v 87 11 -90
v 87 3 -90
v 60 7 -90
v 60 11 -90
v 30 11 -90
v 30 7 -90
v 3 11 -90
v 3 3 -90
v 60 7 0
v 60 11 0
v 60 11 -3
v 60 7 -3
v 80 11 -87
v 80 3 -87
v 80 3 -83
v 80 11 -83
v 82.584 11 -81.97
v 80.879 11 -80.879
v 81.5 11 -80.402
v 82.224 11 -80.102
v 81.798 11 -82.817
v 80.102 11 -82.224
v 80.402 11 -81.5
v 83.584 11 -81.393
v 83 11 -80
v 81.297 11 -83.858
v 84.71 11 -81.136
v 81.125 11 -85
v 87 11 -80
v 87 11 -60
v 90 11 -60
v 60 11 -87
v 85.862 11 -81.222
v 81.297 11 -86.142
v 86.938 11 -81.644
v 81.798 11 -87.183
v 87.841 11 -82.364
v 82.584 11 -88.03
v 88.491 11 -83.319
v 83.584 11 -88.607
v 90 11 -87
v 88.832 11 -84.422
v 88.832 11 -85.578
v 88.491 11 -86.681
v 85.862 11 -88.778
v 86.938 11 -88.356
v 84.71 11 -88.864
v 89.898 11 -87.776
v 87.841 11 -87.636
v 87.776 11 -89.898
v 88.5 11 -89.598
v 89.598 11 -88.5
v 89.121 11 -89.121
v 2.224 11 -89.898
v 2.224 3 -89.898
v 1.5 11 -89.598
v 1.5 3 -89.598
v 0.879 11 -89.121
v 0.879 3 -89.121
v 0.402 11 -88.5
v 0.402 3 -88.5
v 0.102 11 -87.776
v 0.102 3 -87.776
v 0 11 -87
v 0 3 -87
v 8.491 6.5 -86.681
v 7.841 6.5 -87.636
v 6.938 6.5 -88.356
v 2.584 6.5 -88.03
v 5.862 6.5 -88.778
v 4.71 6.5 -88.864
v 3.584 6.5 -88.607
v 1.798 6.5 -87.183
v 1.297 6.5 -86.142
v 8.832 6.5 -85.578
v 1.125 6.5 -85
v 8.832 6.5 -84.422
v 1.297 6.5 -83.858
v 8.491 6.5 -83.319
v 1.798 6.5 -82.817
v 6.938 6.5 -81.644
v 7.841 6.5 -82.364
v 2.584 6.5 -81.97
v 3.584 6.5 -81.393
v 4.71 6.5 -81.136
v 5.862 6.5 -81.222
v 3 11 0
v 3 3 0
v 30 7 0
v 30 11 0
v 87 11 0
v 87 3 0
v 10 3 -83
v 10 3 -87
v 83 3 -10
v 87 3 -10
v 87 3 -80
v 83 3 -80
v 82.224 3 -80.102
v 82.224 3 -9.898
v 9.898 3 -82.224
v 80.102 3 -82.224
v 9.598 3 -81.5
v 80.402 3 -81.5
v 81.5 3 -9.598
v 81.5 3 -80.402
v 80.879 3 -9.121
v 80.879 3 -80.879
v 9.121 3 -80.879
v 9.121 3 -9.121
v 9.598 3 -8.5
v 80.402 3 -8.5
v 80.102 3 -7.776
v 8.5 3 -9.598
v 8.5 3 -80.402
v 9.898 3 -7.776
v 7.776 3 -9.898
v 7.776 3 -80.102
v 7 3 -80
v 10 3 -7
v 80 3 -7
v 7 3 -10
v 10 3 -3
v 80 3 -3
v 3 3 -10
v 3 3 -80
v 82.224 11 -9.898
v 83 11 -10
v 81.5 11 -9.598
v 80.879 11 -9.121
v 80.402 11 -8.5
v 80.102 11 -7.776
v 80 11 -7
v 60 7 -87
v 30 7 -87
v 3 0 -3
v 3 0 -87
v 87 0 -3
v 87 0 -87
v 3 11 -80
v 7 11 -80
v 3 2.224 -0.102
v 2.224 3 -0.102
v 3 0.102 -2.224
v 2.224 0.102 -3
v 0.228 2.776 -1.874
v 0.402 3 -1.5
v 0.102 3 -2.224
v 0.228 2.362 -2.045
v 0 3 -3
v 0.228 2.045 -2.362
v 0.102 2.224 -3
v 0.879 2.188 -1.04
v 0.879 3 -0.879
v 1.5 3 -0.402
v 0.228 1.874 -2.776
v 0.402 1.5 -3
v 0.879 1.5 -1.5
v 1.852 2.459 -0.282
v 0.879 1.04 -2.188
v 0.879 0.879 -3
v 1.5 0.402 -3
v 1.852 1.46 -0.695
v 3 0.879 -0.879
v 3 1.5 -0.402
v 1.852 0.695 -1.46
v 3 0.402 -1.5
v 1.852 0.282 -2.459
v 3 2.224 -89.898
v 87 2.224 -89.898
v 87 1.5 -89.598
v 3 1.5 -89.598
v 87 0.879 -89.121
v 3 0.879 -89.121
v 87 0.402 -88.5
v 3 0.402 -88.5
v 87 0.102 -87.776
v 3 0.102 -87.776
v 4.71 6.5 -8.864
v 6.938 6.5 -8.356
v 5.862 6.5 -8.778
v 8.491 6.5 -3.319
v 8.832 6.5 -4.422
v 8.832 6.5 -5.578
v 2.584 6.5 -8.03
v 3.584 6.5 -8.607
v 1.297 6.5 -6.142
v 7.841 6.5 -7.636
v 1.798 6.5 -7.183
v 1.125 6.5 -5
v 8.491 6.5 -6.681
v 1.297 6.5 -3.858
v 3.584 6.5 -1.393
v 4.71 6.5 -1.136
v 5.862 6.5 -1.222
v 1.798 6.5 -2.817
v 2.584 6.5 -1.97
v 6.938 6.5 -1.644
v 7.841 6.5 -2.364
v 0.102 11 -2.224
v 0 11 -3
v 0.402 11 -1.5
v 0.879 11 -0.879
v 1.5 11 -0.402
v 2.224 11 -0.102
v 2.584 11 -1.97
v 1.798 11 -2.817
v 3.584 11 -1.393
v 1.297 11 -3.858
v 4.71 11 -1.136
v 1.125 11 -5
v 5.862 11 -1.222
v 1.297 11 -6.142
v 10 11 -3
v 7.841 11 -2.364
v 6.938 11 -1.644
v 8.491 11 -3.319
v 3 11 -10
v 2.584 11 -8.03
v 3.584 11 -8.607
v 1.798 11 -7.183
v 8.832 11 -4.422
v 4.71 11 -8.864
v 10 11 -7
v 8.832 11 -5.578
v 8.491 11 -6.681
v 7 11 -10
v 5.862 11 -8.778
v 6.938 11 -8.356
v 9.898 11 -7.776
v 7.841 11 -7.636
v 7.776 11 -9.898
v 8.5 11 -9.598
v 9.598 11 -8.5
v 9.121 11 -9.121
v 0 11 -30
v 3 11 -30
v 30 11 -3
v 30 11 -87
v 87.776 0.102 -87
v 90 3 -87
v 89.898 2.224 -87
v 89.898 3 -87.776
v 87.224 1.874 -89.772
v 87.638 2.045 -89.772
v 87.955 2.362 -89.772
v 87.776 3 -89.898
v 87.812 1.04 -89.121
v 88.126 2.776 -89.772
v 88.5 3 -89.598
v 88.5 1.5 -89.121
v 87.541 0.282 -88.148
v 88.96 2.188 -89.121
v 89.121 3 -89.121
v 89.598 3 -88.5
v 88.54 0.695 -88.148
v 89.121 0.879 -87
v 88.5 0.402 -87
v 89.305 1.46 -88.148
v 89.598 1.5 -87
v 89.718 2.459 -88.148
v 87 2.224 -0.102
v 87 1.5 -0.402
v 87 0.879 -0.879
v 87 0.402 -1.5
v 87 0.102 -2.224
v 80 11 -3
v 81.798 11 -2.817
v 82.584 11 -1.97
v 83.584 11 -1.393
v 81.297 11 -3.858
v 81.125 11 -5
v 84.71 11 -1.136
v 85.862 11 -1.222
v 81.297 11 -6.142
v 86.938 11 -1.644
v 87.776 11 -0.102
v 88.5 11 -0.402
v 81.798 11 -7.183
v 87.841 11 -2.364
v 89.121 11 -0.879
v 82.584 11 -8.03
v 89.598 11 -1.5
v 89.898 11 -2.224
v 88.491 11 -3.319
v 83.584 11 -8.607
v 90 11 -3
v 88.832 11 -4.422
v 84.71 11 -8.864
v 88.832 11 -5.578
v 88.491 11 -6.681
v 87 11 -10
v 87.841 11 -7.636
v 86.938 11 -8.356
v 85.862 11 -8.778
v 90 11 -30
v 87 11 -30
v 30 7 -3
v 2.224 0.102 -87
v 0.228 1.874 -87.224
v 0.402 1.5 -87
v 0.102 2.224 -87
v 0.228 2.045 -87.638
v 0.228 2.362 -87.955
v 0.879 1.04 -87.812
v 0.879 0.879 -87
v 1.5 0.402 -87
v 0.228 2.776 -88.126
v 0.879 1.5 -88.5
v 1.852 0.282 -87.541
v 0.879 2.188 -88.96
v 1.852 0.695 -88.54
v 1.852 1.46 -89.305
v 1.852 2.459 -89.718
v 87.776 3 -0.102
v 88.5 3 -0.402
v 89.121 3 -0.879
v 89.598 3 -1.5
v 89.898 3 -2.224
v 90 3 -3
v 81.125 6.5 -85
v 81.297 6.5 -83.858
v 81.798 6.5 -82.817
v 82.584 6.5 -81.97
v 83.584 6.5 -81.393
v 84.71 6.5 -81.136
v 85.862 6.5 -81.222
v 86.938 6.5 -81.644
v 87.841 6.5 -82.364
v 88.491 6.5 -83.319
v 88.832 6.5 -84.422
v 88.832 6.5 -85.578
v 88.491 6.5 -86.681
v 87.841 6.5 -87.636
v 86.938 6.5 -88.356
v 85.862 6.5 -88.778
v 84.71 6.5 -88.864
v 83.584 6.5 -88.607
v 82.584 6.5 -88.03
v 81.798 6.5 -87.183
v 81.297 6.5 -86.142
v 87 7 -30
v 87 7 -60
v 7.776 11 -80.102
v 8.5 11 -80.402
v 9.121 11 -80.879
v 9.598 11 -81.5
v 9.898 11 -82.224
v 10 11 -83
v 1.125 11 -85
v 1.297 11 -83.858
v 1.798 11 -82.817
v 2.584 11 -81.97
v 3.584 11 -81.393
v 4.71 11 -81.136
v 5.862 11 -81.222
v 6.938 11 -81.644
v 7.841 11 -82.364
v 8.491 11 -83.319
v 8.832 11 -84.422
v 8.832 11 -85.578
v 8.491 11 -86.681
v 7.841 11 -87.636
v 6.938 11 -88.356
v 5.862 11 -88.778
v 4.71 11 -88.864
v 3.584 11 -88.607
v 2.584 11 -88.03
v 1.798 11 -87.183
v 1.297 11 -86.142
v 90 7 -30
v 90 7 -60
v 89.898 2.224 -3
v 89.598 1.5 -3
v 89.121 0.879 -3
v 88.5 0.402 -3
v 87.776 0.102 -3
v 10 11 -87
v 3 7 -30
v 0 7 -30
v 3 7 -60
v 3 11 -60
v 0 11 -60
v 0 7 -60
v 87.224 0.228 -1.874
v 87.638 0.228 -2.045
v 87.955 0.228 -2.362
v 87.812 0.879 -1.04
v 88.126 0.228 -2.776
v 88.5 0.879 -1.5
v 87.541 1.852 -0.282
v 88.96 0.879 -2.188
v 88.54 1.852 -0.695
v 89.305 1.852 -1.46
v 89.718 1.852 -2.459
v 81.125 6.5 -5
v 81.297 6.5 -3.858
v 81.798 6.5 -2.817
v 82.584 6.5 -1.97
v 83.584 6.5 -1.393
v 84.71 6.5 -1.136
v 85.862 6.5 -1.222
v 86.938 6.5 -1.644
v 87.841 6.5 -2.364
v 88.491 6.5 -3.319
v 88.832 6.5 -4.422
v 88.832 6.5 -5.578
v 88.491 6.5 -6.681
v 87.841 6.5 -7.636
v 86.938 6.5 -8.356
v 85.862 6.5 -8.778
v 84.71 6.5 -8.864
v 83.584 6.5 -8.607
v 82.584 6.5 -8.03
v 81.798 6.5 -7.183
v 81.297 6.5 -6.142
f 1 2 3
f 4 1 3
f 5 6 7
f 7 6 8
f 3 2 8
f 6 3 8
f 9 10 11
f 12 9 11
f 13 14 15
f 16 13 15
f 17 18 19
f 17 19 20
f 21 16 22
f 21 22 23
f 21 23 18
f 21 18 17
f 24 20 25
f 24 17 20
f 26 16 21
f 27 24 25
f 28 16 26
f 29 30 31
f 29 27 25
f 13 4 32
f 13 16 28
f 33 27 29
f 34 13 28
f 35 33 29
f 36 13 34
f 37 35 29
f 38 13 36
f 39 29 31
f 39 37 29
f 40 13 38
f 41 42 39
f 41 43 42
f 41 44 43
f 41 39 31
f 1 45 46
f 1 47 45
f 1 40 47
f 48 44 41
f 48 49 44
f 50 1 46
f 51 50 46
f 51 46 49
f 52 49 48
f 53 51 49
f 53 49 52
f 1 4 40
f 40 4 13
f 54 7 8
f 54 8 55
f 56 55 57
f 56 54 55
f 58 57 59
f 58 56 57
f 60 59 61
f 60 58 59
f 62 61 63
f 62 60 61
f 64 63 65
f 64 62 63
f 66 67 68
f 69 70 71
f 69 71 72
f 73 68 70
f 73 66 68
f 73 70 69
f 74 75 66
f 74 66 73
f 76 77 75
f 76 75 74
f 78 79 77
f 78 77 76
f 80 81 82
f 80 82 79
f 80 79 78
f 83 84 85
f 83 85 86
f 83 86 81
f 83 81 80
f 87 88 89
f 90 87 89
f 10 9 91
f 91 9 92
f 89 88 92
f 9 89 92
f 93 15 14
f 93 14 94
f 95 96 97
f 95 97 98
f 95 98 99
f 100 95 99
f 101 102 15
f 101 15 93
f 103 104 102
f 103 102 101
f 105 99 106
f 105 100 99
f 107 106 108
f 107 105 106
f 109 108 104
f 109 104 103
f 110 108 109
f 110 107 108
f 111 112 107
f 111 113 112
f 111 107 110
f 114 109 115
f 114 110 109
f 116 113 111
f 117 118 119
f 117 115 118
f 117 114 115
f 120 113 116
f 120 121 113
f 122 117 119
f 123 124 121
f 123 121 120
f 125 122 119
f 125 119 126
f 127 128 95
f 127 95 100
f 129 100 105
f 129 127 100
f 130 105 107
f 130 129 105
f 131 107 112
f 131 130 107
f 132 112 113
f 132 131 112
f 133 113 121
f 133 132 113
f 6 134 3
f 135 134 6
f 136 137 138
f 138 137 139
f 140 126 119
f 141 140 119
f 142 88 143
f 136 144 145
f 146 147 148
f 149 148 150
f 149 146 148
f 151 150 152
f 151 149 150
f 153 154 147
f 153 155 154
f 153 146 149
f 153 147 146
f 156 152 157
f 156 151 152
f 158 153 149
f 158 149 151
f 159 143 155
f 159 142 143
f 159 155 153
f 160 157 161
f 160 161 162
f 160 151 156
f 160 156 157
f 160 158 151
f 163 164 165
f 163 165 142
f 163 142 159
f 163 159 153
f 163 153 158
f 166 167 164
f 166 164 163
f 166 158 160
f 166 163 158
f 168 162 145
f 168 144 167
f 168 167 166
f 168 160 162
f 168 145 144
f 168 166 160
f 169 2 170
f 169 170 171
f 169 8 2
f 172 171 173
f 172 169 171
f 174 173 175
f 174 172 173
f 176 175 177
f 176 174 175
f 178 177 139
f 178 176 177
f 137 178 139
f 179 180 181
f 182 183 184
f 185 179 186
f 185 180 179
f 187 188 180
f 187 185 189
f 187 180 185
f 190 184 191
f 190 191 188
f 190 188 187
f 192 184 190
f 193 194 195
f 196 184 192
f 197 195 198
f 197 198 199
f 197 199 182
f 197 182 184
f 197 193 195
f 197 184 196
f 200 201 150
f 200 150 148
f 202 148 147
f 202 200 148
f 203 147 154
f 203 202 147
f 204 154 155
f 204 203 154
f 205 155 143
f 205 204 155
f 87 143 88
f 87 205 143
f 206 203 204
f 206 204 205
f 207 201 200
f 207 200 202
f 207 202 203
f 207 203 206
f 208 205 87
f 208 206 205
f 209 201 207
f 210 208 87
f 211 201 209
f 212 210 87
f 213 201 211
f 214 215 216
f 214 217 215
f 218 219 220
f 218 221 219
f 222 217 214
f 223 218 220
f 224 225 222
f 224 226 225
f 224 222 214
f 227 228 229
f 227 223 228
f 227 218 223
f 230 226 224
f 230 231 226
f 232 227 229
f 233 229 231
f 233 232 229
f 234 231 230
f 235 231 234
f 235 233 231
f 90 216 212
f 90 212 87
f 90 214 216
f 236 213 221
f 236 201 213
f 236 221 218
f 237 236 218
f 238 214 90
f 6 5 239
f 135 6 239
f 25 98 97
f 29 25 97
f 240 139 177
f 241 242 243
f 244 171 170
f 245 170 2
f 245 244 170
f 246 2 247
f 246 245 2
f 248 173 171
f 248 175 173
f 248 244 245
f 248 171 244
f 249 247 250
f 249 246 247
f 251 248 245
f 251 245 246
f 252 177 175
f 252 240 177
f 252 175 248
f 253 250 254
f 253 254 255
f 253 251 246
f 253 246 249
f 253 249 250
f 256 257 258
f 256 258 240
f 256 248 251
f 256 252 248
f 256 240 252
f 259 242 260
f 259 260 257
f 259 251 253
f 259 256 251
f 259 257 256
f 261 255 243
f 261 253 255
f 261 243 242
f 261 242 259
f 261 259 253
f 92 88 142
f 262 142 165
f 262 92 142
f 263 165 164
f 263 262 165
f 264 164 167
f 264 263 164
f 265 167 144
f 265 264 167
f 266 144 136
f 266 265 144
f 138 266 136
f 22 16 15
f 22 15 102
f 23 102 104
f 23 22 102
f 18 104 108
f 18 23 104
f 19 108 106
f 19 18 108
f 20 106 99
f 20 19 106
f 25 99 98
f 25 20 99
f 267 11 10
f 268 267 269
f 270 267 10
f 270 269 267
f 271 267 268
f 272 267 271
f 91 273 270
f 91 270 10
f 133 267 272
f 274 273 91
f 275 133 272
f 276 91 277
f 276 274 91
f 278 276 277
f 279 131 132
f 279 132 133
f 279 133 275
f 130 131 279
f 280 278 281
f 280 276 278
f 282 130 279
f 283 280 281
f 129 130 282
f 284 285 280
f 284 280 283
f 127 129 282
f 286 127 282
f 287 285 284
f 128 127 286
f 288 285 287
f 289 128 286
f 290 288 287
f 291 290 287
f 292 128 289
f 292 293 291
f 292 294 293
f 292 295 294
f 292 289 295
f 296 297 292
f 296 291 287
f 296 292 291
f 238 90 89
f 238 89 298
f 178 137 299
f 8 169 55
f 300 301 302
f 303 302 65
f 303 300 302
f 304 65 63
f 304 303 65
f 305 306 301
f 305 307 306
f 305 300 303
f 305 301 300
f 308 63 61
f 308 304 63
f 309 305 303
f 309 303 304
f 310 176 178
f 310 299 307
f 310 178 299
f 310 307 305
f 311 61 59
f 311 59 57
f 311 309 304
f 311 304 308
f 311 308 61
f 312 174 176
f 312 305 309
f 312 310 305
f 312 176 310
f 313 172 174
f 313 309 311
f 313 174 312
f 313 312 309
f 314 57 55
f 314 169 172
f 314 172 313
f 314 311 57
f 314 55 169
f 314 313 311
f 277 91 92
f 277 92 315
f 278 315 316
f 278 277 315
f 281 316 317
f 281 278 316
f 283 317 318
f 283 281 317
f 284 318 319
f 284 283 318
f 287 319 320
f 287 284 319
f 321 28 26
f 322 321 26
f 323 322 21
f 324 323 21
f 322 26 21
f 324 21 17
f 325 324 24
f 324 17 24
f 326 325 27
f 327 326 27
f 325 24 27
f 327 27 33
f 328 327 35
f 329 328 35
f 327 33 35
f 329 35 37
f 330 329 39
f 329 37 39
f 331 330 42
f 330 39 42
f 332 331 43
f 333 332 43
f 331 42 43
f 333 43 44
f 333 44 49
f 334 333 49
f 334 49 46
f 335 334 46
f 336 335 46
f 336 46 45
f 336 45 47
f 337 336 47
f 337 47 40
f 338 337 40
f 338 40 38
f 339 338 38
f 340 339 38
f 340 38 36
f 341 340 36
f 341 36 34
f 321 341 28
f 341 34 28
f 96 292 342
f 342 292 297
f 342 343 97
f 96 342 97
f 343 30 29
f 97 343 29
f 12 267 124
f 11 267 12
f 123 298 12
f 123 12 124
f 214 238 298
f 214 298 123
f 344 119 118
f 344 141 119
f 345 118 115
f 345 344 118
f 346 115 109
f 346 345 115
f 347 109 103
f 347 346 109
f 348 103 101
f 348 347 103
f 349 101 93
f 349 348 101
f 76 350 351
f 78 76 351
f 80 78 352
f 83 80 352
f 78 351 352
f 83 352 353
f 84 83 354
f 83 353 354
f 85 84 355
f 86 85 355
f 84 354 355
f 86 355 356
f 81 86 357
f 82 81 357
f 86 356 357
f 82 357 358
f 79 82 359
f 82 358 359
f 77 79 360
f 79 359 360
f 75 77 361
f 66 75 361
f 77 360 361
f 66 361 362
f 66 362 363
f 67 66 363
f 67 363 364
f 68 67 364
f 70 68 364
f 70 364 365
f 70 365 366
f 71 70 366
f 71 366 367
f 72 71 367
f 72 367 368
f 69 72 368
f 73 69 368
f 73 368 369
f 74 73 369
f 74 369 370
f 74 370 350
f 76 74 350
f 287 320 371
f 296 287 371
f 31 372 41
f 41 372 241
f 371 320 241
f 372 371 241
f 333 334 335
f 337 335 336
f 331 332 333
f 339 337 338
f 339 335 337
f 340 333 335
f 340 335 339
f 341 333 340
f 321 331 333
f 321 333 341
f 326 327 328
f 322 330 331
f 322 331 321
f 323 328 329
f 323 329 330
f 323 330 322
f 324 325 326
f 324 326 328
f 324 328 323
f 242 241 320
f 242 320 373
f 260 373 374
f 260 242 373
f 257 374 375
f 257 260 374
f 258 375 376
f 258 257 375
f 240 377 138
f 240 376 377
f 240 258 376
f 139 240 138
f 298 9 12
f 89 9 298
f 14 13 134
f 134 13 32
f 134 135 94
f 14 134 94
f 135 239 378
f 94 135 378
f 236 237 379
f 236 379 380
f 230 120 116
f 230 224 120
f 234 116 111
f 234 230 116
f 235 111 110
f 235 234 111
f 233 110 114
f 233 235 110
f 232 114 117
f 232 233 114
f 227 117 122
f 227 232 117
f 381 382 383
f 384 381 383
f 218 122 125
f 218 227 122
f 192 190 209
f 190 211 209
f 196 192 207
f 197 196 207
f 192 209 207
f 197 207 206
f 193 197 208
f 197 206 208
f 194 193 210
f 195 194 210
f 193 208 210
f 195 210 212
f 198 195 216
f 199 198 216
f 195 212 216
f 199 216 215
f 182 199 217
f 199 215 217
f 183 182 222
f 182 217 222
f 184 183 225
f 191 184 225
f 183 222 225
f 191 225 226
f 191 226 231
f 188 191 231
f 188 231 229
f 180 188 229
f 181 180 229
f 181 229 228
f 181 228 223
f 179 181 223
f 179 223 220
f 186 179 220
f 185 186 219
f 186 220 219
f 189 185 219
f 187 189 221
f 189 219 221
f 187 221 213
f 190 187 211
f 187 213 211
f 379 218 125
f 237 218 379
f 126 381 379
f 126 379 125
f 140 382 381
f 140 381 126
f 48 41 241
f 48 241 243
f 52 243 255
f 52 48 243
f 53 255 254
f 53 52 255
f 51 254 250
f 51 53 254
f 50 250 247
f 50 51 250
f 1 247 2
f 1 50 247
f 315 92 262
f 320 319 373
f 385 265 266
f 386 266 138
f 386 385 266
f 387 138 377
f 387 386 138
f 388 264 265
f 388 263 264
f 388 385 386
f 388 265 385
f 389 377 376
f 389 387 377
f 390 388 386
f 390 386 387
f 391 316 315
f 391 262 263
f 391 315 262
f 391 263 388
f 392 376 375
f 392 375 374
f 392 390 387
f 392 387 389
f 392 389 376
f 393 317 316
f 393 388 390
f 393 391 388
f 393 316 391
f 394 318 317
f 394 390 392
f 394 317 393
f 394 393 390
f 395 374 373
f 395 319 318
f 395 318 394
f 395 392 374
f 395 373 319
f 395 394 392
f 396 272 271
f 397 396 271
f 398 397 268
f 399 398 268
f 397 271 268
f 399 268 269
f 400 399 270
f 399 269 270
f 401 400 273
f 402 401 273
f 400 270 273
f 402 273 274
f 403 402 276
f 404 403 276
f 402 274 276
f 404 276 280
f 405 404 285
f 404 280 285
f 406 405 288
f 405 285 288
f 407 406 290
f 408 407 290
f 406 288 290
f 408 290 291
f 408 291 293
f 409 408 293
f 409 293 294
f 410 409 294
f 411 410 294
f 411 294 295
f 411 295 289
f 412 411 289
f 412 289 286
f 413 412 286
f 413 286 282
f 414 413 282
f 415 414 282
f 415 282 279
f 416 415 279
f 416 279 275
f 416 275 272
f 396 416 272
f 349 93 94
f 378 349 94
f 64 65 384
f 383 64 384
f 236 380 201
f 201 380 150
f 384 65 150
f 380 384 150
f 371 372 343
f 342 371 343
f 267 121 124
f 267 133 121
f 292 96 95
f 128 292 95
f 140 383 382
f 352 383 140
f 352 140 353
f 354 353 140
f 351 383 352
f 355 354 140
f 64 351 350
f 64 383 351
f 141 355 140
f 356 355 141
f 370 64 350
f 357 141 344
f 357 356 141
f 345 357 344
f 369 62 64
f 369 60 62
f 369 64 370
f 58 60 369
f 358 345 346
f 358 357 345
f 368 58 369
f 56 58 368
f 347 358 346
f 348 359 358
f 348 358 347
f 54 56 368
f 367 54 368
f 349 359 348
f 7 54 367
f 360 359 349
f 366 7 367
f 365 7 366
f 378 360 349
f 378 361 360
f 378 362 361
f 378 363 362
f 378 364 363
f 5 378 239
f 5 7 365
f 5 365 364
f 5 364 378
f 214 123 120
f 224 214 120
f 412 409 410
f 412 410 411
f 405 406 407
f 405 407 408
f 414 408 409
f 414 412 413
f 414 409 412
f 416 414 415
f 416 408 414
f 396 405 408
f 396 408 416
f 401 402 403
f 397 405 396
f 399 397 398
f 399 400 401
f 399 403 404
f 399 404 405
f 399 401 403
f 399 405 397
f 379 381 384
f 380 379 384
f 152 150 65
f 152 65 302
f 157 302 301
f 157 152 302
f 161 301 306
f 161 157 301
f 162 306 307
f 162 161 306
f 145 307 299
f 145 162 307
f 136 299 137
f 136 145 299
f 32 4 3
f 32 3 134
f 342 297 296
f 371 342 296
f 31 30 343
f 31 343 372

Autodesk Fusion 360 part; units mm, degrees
sketch "Sketch1" plane through (0, 0, 0) normal (0, 1, 0) x (1, 0, 0)
  line L0 (0, 0) -> (90, 0)
  line L1 (90, 0) -> (90, 90)
  line L2 (90, 90) -> (0, 90)
  line L3 (0, 90) -> (0, 0)
  dimension "d1" = 90
  dimension "d2" = 90
extrude "Extrude1" add sketch "Sketch1" along normal blind 11
sketch "Sketch2" plane through (0, 11, 0) normal (0, 1, 0) x (-1, 0, 0)
  line L0 (0, -90) -> (0, 0)
  line L1 (0, 0) -> (-90, 0)
  line L2 (-90, 0) -> (-90, -90)
  line L3 (-90, -90) -> (0, -90)
  circle A0 centre (-5, -85) radius 3.875
  circle A1 centre (-5, -5) radius 3.875
  circle A2 centre (-85, -5) radius 3.875
  circle A3 centre (-85, -85) radius 3.875
  dimension "d5" = 7.75
  dimension "d6" = 7.75
  dimension "d7" = 7.75
  dimension "d8" = 7.75
extrude "Extrude2" cut sketch "Sketch2" against normal blind 4.5 contours A0 | A1 | A2 | A3
sketch "Sketch3" plane through (0, 11, 0) normal (0, 1, 0) x (-1, 0, 0)
  circle A0 centre (-85, -85) radius 3.875
  circle A1 centre (-5, -5) radius 3.875
  circle A2 centre (-5, -85) radius 3.875
  circle A3 centre (-85, -5) radius 3.875
  line L0 (0, -90) -> (0, 0)
  line L1 (0, 0) -> (-90, 0)
  line L2 (-90, 0) -> (-90, -90)
  line L3 (-90, -90) -> (0, -90)
  line L4 (-90, -80) -> (-90, -10)
  line L5 (0, -10) -> (0, -80)
  line L6 (-10, -90) -> (-80, -90)
  line L7 (-80, 0) -> (-10, 0)
  line L8 (-10, 0) -> (-10, -7)
  line L9 (-10, -83) -> (-10, -90)
  line L10 (-90, -10) -> (-83, -10)
  line L11 (-7, -10) -> (0, -10)
  line L12 (-80, -90) -> (-80, -83)
  line L13 (-80, -7) -> (-80, 0)
  line L14 (0, -80) -> (-7, -80)
  line L15 (-83, -80) -> (-90, -80)
  line L16 (0, -10) -> (-3, -10)
  line L17 (-3, -10) -> (-3, -30)
  line L18 (-3, -30) -> (0, -30)
  line L19 (0, -30) -> (0, -10)
  line L20 (0, -80) -> (-3, -80)
  line L21 (-3, -80) -> (-3, -60)
  line L22 (-3, -60) -> (0, -60)
  line L23 (0, -60) -> (0, -80)
  line L24 (-10, -90) -> (-30, -90)
  line L25 (-30, -90) -> (-30, -87)
  line L26 (-30, -87) -> (-10, -87)
  line L27 (-10, -87) -> (-10, -90)
  line L28 (-80, -90) -> (-60, -90)
  line L29 (-60, -90) -> (-60, -87)
  line L30 (-60, -87) -> (-80, -87)
  line L31 (-80, -87) -> (-80, -90)
  line L32 (-90, -80) -> (-87, -80)
  line L33 (-87, -80) -> (-87, -60)
  line L34 (-87, -60) -> (-90, -60)
  line L35 (-90, -60) -> (-90, -80)
  line L36 (-90, -10) -> (-87, -10)
  line L37 (-87, -10) -> (-87, -30)
  line L38 (-87, -30) -> (-90, -30)
  line L39 (-90, -30) -> (-90, -10)
  line L40 (-80, 0) -> (-60, 0)
  line L41 (-60, 0) -> (-60, -3)
  line L42 (-60, -3) -> (-80, -3)
  line L43 (-80, -3) -> (-80, 0)
  line L44 (-10, 0) -> (-30, 0)
  line L45 (-30, 0) -> (-30, -3)
  line L46 (-30, -3) -> (-10, -3)
  line L47 (-10, -3) -> (-10, 0)
  arc A4 (-10, -7) -> (-7, -10) centre (-7, -7) ccw
  arc A5 (-83, -10) -> (-80, -7) centre (-83, -7) ccw
  arc A6 (-80, -83) -> (-83, -80) centre (-83, -83) ccw
  arc A7 (-7, -80) -> (-10, -83) centre (-7, -83) ccw
  dimension "d11" = 20
  dimension "d12" = 3
  dimension "d13" = 20
  dimension "d14" = 3
  dimension "d15" = 20
  dimension "d16" = 3
  dimension "d17" = 20
  dimension "d18" = 3
  dimension "d19" = 3
  dimension "d20" = 20
  dimension "d21" = 3
  dimension "d22" = 20
  dimension "d23" = 3
  dimension "d24" = 20
  dimension "d25" = 20
  dimension "d26" = 3
  dimension "d27" = 3
  dimension "d28" = 3
extrude "Extrude3" cut sketch "Sketch3" against normal blind 8 contours L0 L1 L2 L3 L4 L5 L6 L7 L8 L9 L10 L11 L12 L13 L14 L15 L17 L18 L21 L22 L25 L26 L29 L30 L33 L34 L37 L38 L41 L42 L45 L46 A4 A5 A6 A7
sketch "Sketch4" plane through (0, 3, 0) normal (0, 1, 0) x (-1, 0, 0)
  line L0 (-3, -80) -> (-3, -60)
  line L1 (-3, -60) -> (0, -60)
  line L2 (0, -60) -> (0, -30)
  line L3 (0, -30) -> (-3, -30)
  line L4 (-3, -30) -> (-3, -10)
  line L5 (-3, -10) -> (-7, -10)
  arc A0 (-10, -7) -> (-7, -10) centre (-7, -7) ccw
  line L6 (-10, -7) -> (-10, -3)
  line L7 (-10, -3) -> (-30, -3)
  line L8 (-30, -3) -> (-30, 0)
  line L9 (-30, 0) -> (-60, 0)
  line L10 (-60, 0) -> (-60, -3)
  line L11 (-60, -3) -> (-80, -3)
  line L12 (-80, -3) -> (-80, -7)
  arc A1 (-83, -10) -> (-80, -7) centre (-83, -7) ccw
  line L13 (-83, -10) -> (-87, -10)
  line L14 (-87, -10) -> (-87, -30)
  line L15 (-87, -30) -> (-90, -30)
  line L16 (-90, -30) -> (-90, -60)
  line L17 (-90, -60) -> (-87, -60)
  line L18 (-87, -60) -> (-87, -80)
  line L19 (-87, -80) -> (-83, -80)
  arc A2 (-80, -83) -> (-83, -80) centre (-83, -83) ccw
  line L20 (-80, -83) -> (-80, -87)
  line L21 (-80, -87) -> (-60, -87)
  line L22 (-60, -87) -> (-60, -90)
  line L23 (-60, -90) -> (-30, -90)
  line L24 (-30, -90) -> (-30, -87)
  line L25 (-30, -87) -> (-10, -87)
  line L26 (-10, -87) -> (-10, -83)
  arc A3 (-7, -80) -> (-10, -83) centre (-7, -83) ccw
  line L27 (-7, -80) -> (-3, -80)
  line L28 (0, -60) -> (-3, -60)
  line L29 (-3, -60) -> (-3, -30)
  line L30 (-3, -30) -> (0, -30)
  line L31 (0, -30) -> (0, -60)
  line L32 (-87, -30) -> (-90, -30)
  line L33 (-90, -30) -> (-90, -60)
  line L34 (-90, -60) -> (-87, -60)
  line L35 (-87, -60) -> (-87, -30)
  line L36 (-30, 0) -> (-60, 0)
  line L37 (-60, 0) -> (-60, -3)
  line L38 (-60, -3) -> (-30, -3)
  line L39 (-30, -3) -> (-30, 0)
  line L40 (-30, -90) -> (-60, -90)
  line L41 (-60, -90) -> (-60, -87)
  line L42 (-60, -87) -> (-30, -87)
  line L43 (-30, -87) -> (-30, -90)
extrude "Extrude4" add sketch "Sketch4" along normal blind 4 contours L1 L2 L3 L28 L29 L30 L31 | L22 L23 L24 L40 L41 L42 L43 | L8 L9 L10 L36 L37 L38 L39 | L15 L16 L17 L32 L33 L34 L35
fillet "Fillet1" radius 3 8 edges at (90, 5.5, 0) (90, 0, -45) (45, 0, 0) (90, 5.5, -90) (45, 0, -90) (0, 5.5, -90) (0, 0, -45) (0, 5.5, 0)
sketch "Sketch6" plane through (0, 3, 0) normal (0, 1, 0) x (-1, 0, 0)
  line L0 (-87, -10) -> (-87, -80)
  line L1 (-87, -80) -> (-83, -80)
  arc A0 (-80, -83) -> (-83, -80) centre (-83, -83) ccw
  line L2 (-80, -83) -> (-80, -87)
  line L3 (-80, -87) -> (-10, -87)
  line L4 (-10, -87) -> (-10, -83)
  arc A1 (-7, -80) -> (-10, -83) centre (-7, -83) ccw
  line L5 (-7, -80) -> (-3, -80)
  line L6 (-3, -80) -> (-3, -10)
  line L7 (-3, -10) -> (-7, -10)
  arc A2 (-10, -7) -> (-7, -10) centre (-7, -7) ccw
  line L8 (-10, -7) -> (-10, -3)
  line L9 (-10, -3) -> (-80, -3)
  line L10 (-80, -3) -> (-80, -7)
  arc A3 (-83, -10) -> (-80, -7) centre (-83, -7) ccw
  line L11 (-83, -10) -> (-87, -10)
  arc A4 (-3, -90) -> (0, -87) centre (-3, -87) ccw
  line L12 (0, -87) -> (0, -60)
sketch "Sketch7" plane through (45, 3, -45) normal (0, 1, 0) x (-1, 0, 0)
